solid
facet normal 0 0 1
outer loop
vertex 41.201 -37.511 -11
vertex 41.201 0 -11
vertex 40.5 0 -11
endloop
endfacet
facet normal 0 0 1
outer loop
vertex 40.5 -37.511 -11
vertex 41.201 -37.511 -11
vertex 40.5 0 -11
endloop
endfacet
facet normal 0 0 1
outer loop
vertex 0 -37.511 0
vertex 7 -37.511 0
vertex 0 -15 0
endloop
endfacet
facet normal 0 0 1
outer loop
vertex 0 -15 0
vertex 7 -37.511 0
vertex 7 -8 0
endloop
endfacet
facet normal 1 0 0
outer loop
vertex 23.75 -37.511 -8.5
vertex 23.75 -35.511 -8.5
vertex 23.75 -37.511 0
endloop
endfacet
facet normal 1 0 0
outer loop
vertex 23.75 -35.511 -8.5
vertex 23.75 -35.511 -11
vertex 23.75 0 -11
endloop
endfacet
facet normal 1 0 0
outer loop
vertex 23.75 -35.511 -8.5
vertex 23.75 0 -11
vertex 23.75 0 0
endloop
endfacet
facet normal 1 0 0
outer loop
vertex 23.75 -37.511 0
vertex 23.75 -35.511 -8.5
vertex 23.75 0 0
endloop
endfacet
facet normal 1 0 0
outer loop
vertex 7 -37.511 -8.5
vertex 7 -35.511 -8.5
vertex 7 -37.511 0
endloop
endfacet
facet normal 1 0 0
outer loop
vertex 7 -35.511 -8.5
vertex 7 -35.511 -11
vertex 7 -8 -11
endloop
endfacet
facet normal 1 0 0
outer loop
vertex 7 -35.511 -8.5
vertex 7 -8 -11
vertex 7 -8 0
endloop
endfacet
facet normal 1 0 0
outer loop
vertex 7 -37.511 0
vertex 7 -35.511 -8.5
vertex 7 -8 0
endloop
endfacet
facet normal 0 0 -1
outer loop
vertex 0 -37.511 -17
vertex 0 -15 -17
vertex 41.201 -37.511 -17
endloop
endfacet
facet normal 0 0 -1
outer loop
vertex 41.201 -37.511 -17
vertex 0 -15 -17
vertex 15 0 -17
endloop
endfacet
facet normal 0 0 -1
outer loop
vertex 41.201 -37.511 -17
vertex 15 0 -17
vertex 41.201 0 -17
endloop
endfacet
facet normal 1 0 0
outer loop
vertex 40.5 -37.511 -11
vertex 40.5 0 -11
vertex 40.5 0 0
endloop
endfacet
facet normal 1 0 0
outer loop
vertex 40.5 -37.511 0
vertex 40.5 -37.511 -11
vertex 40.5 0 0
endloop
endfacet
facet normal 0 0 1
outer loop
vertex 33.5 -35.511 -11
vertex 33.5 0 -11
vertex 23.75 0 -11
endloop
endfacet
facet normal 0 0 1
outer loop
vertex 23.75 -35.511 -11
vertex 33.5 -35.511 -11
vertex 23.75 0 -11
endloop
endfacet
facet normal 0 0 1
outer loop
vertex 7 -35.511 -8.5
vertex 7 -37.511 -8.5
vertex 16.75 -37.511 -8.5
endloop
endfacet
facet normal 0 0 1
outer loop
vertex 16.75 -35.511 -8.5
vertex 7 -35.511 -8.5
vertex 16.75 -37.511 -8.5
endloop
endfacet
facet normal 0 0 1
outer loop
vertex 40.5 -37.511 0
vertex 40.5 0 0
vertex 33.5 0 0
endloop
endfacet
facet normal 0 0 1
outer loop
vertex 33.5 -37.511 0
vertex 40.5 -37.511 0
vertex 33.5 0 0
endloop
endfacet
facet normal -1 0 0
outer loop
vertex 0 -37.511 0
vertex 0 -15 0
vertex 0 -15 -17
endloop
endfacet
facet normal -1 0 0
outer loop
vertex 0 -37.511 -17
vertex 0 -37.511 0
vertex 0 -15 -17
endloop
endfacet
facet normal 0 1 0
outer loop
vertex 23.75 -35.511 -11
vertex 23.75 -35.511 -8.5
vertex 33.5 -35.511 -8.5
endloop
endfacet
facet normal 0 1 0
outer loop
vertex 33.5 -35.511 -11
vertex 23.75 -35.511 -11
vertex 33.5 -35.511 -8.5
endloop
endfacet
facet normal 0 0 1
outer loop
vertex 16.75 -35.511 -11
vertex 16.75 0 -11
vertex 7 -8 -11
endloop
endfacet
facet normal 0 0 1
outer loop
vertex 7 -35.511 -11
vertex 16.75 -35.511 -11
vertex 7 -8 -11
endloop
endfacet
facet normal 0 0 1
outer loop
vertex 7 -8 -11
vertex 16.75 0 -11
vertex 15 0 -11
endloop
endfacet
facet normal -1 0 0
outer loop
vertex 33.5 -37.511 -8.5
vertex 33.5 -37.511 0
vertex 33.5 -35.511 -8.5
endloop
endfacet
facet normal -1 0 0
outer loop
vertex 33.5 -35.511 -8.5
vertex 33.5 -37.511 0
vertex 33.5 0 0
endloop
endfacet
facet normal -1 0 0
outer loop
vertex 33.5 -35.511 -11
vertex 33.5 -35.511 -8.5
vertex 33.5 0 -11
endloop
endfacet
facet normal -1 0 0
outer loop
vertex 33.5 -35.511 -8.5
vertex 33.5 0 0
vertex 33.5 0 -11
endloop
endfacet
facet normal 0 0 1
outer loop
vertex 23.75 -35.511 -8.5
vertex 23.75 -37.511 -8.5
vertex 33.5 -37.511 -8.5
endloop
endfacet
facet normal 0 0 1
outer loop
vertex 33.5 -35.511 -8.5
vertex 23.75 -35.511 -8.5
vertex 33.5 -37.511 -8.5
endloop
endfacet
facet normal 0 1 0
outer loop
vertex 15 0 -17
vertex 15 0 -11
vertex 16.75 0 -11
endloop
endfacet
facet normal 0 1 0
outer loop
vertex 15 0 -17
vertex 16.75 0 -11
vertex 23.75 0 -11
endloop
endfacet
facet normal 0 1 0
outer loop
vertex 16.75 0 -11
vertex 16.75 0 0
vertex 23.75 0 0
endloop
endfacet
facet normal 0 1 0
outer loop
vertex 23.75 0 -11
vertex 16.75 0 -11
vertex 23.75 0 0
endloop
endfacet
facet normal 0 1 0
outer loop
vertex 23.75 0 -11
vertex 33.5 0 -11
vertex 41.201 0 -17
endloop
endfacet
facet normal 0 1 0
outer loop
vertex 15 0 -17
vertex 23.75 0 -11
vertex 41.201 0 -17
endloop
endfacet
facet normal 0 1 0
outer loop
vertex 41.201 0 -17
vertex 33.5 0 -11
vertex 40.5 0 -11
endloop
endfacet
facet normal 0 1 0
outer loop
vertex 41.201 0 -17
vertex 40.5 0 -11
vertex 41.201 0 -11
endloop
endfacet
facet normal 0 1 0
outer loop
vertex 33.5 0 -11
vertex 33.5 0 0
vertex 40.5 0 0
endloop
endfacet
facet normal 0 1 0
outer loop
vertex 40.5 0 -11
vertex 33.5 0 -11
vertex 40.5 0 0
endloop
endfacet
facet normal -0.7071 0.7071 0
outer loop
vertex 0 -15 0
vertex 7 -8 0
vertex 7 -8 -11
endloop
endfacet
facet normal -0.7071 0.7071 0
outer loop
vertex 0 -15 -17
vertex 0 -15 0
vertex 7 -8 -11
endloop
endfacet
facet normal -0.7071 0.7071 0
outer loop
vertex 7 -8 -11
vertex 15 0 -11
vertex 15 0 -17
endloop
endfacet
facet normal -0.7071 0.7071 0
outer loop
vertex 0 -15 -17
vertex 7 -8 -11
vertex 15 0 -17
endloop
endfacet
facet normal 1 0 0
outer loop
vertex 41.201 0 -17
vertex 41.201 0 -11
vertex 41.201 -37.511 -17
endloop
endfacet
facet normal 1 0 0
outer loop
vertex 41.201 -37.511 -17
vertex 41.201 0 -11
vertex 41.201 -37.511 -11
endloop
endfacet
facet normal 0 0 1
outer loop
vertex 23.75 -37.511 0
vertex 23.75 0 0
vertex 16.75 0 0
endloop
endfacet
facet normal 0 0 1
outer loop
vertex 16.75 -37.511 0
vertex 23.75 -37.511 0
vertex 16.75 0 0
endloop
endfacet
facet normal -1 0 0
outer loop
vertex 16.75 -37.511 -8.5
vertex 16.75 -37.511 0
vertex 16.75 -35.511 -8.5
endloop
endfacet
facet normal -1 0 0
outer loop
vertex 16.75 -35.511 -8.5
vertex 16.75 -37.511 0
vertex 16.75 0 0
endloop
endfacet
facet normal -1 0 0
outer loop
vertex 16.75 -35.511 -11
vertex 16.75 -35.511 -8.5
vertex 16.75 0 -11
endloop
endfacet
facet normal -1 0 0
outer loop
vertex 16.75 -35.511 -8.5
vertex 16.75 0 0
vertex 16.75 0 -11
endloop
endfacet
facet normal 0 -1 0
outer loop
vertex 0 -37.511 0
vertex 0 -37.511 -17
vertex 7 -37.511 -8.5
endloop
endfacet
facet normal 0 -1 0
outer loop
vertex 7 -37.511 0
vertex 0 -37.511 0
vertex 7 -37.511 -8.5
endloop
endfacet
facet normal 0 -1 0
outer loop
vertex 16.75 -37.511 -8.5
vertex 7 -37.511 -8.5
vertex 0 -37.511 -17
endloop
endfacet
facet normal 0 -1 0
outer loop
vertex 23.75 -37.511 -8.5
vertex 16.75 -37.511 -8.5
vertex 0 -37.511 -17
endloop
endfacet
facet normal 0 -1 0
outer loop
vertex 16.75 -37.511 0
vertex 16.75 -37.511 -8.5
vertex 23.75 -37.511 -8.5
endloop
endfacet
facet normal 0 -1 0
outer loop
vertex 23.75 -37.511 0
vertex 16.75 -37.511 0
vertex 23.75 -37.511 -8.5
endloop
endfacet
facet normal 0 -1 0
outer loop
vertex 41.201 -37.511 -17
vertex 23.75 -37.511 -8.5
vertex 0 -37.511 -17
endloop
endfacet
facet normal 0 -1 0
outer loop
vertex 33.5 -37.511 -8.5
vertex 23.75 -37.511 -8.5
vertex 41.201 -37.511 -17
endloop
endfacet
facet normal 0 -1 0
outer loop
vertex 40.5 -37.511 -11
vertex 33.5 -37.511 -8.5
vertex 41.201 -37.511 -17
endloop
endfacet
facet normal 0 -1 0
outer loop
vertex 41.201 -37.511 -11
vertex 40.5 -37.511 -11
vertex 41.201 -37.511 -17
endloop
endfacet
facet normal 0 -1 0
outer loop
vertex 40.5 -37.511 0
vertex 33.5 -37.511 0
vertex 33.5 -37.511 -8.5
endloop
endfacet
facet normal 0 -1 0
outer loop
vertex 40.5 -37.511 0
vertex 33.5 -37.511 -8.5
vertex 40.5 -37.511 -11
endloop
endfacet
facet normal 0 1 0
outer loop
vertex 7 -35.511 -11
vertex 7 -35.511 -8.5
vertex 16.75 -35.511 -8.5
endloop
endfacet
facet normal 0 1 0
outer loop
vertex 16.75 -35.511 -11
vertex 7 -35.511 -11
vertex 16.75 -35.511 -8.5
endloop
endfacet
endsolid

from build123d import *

# Parameters (mm, degrees)
F1_DEPTH = 100
F2_SIZE2 = 15
F2_SIZE  = 15
F3_W     = 8.609191
F3_H     = 79.327516
F3_W_2   = 51.655116
F4_DEPTH = 17.001
F5_W     = 26.5
F5_H     = 2.5
F6_DEPTH = 2


with BuildPart() as f1:
    # F0 (on Front) → F1 (new body)
    with BuildSketch(Plane.XZ):
        Polygon((7, 0), (0, 0), (0, -17), (208, -17), (208, 0), (201, 0), (201, -11), (191.25, -11), (191.25, 0), (184.25, 0), (184.25, -11), (174.5, -11), (174.5, 0), (167.5, 0), (167.5, -11), (157.75, -11), (157.75, 0), (150.75, 0), (150.75, -11), (141, -11), (141, 0), (134, 0), (134, -11), (124.25, -11), (124.25, 0), (117.25, 0), (117.25, -11), (107.5, -11), (107.5, 0), (100.5, 0), (100.5, -11), (90.75, -11), (90.75, 0), (83.75, 0), (83.75, -11), (74, -11), (74, 0), (67, 0), (67, -11), (57.25, -11), (57.25, 0), (50.25, 0), (50.25, -11), (40.5, -11), (40.5, 0), (33.5, 0), (33.5, -11), (23.75, -11), (23.75, 0), (16.75, 0), (16.75, -11), (7, -11), align=None)
    extrude(amount=F1_DEPTH)

    # F2
    f2_edges = [f1.edges().sort_by_distance(p)[0] for p in [
        (0, 0, -8.5),
    ]]
    chamfer(f2_edges, length=F2_SIZE, length2=F2_SIZE2)

    # F3 (on Top) → F4 (cut, through all)
    with BuildSketch(Plane.XY):
        Polygon((214.614749, -116.838969), (214.614749, 11.068958), (41.201111, 11.068958), (41.201111, -37.511453), (49.810302, -37.511453), (49.810302, -116.838969), align=None)
        with Locations((45.505707, -77.175211)):
            Rectangle(F3_W, F3_H)
        with Locations((15.373553, -77.175211)):
            Rectangle(F3_W_2, F3_H)
    extrude(amount=-F4_DEPTH, mode=Mode.SUBTRACT)

    # F5 (on face) → F6 (join)
    with BuildSketch(Plane.XZ.offset(37.511453)):
        with Locations((20.25, -9.75)):
            Rectangle(F5_W, F5_H)
    extrude(amount=-F6_DEPTH)


solid = f1.part
